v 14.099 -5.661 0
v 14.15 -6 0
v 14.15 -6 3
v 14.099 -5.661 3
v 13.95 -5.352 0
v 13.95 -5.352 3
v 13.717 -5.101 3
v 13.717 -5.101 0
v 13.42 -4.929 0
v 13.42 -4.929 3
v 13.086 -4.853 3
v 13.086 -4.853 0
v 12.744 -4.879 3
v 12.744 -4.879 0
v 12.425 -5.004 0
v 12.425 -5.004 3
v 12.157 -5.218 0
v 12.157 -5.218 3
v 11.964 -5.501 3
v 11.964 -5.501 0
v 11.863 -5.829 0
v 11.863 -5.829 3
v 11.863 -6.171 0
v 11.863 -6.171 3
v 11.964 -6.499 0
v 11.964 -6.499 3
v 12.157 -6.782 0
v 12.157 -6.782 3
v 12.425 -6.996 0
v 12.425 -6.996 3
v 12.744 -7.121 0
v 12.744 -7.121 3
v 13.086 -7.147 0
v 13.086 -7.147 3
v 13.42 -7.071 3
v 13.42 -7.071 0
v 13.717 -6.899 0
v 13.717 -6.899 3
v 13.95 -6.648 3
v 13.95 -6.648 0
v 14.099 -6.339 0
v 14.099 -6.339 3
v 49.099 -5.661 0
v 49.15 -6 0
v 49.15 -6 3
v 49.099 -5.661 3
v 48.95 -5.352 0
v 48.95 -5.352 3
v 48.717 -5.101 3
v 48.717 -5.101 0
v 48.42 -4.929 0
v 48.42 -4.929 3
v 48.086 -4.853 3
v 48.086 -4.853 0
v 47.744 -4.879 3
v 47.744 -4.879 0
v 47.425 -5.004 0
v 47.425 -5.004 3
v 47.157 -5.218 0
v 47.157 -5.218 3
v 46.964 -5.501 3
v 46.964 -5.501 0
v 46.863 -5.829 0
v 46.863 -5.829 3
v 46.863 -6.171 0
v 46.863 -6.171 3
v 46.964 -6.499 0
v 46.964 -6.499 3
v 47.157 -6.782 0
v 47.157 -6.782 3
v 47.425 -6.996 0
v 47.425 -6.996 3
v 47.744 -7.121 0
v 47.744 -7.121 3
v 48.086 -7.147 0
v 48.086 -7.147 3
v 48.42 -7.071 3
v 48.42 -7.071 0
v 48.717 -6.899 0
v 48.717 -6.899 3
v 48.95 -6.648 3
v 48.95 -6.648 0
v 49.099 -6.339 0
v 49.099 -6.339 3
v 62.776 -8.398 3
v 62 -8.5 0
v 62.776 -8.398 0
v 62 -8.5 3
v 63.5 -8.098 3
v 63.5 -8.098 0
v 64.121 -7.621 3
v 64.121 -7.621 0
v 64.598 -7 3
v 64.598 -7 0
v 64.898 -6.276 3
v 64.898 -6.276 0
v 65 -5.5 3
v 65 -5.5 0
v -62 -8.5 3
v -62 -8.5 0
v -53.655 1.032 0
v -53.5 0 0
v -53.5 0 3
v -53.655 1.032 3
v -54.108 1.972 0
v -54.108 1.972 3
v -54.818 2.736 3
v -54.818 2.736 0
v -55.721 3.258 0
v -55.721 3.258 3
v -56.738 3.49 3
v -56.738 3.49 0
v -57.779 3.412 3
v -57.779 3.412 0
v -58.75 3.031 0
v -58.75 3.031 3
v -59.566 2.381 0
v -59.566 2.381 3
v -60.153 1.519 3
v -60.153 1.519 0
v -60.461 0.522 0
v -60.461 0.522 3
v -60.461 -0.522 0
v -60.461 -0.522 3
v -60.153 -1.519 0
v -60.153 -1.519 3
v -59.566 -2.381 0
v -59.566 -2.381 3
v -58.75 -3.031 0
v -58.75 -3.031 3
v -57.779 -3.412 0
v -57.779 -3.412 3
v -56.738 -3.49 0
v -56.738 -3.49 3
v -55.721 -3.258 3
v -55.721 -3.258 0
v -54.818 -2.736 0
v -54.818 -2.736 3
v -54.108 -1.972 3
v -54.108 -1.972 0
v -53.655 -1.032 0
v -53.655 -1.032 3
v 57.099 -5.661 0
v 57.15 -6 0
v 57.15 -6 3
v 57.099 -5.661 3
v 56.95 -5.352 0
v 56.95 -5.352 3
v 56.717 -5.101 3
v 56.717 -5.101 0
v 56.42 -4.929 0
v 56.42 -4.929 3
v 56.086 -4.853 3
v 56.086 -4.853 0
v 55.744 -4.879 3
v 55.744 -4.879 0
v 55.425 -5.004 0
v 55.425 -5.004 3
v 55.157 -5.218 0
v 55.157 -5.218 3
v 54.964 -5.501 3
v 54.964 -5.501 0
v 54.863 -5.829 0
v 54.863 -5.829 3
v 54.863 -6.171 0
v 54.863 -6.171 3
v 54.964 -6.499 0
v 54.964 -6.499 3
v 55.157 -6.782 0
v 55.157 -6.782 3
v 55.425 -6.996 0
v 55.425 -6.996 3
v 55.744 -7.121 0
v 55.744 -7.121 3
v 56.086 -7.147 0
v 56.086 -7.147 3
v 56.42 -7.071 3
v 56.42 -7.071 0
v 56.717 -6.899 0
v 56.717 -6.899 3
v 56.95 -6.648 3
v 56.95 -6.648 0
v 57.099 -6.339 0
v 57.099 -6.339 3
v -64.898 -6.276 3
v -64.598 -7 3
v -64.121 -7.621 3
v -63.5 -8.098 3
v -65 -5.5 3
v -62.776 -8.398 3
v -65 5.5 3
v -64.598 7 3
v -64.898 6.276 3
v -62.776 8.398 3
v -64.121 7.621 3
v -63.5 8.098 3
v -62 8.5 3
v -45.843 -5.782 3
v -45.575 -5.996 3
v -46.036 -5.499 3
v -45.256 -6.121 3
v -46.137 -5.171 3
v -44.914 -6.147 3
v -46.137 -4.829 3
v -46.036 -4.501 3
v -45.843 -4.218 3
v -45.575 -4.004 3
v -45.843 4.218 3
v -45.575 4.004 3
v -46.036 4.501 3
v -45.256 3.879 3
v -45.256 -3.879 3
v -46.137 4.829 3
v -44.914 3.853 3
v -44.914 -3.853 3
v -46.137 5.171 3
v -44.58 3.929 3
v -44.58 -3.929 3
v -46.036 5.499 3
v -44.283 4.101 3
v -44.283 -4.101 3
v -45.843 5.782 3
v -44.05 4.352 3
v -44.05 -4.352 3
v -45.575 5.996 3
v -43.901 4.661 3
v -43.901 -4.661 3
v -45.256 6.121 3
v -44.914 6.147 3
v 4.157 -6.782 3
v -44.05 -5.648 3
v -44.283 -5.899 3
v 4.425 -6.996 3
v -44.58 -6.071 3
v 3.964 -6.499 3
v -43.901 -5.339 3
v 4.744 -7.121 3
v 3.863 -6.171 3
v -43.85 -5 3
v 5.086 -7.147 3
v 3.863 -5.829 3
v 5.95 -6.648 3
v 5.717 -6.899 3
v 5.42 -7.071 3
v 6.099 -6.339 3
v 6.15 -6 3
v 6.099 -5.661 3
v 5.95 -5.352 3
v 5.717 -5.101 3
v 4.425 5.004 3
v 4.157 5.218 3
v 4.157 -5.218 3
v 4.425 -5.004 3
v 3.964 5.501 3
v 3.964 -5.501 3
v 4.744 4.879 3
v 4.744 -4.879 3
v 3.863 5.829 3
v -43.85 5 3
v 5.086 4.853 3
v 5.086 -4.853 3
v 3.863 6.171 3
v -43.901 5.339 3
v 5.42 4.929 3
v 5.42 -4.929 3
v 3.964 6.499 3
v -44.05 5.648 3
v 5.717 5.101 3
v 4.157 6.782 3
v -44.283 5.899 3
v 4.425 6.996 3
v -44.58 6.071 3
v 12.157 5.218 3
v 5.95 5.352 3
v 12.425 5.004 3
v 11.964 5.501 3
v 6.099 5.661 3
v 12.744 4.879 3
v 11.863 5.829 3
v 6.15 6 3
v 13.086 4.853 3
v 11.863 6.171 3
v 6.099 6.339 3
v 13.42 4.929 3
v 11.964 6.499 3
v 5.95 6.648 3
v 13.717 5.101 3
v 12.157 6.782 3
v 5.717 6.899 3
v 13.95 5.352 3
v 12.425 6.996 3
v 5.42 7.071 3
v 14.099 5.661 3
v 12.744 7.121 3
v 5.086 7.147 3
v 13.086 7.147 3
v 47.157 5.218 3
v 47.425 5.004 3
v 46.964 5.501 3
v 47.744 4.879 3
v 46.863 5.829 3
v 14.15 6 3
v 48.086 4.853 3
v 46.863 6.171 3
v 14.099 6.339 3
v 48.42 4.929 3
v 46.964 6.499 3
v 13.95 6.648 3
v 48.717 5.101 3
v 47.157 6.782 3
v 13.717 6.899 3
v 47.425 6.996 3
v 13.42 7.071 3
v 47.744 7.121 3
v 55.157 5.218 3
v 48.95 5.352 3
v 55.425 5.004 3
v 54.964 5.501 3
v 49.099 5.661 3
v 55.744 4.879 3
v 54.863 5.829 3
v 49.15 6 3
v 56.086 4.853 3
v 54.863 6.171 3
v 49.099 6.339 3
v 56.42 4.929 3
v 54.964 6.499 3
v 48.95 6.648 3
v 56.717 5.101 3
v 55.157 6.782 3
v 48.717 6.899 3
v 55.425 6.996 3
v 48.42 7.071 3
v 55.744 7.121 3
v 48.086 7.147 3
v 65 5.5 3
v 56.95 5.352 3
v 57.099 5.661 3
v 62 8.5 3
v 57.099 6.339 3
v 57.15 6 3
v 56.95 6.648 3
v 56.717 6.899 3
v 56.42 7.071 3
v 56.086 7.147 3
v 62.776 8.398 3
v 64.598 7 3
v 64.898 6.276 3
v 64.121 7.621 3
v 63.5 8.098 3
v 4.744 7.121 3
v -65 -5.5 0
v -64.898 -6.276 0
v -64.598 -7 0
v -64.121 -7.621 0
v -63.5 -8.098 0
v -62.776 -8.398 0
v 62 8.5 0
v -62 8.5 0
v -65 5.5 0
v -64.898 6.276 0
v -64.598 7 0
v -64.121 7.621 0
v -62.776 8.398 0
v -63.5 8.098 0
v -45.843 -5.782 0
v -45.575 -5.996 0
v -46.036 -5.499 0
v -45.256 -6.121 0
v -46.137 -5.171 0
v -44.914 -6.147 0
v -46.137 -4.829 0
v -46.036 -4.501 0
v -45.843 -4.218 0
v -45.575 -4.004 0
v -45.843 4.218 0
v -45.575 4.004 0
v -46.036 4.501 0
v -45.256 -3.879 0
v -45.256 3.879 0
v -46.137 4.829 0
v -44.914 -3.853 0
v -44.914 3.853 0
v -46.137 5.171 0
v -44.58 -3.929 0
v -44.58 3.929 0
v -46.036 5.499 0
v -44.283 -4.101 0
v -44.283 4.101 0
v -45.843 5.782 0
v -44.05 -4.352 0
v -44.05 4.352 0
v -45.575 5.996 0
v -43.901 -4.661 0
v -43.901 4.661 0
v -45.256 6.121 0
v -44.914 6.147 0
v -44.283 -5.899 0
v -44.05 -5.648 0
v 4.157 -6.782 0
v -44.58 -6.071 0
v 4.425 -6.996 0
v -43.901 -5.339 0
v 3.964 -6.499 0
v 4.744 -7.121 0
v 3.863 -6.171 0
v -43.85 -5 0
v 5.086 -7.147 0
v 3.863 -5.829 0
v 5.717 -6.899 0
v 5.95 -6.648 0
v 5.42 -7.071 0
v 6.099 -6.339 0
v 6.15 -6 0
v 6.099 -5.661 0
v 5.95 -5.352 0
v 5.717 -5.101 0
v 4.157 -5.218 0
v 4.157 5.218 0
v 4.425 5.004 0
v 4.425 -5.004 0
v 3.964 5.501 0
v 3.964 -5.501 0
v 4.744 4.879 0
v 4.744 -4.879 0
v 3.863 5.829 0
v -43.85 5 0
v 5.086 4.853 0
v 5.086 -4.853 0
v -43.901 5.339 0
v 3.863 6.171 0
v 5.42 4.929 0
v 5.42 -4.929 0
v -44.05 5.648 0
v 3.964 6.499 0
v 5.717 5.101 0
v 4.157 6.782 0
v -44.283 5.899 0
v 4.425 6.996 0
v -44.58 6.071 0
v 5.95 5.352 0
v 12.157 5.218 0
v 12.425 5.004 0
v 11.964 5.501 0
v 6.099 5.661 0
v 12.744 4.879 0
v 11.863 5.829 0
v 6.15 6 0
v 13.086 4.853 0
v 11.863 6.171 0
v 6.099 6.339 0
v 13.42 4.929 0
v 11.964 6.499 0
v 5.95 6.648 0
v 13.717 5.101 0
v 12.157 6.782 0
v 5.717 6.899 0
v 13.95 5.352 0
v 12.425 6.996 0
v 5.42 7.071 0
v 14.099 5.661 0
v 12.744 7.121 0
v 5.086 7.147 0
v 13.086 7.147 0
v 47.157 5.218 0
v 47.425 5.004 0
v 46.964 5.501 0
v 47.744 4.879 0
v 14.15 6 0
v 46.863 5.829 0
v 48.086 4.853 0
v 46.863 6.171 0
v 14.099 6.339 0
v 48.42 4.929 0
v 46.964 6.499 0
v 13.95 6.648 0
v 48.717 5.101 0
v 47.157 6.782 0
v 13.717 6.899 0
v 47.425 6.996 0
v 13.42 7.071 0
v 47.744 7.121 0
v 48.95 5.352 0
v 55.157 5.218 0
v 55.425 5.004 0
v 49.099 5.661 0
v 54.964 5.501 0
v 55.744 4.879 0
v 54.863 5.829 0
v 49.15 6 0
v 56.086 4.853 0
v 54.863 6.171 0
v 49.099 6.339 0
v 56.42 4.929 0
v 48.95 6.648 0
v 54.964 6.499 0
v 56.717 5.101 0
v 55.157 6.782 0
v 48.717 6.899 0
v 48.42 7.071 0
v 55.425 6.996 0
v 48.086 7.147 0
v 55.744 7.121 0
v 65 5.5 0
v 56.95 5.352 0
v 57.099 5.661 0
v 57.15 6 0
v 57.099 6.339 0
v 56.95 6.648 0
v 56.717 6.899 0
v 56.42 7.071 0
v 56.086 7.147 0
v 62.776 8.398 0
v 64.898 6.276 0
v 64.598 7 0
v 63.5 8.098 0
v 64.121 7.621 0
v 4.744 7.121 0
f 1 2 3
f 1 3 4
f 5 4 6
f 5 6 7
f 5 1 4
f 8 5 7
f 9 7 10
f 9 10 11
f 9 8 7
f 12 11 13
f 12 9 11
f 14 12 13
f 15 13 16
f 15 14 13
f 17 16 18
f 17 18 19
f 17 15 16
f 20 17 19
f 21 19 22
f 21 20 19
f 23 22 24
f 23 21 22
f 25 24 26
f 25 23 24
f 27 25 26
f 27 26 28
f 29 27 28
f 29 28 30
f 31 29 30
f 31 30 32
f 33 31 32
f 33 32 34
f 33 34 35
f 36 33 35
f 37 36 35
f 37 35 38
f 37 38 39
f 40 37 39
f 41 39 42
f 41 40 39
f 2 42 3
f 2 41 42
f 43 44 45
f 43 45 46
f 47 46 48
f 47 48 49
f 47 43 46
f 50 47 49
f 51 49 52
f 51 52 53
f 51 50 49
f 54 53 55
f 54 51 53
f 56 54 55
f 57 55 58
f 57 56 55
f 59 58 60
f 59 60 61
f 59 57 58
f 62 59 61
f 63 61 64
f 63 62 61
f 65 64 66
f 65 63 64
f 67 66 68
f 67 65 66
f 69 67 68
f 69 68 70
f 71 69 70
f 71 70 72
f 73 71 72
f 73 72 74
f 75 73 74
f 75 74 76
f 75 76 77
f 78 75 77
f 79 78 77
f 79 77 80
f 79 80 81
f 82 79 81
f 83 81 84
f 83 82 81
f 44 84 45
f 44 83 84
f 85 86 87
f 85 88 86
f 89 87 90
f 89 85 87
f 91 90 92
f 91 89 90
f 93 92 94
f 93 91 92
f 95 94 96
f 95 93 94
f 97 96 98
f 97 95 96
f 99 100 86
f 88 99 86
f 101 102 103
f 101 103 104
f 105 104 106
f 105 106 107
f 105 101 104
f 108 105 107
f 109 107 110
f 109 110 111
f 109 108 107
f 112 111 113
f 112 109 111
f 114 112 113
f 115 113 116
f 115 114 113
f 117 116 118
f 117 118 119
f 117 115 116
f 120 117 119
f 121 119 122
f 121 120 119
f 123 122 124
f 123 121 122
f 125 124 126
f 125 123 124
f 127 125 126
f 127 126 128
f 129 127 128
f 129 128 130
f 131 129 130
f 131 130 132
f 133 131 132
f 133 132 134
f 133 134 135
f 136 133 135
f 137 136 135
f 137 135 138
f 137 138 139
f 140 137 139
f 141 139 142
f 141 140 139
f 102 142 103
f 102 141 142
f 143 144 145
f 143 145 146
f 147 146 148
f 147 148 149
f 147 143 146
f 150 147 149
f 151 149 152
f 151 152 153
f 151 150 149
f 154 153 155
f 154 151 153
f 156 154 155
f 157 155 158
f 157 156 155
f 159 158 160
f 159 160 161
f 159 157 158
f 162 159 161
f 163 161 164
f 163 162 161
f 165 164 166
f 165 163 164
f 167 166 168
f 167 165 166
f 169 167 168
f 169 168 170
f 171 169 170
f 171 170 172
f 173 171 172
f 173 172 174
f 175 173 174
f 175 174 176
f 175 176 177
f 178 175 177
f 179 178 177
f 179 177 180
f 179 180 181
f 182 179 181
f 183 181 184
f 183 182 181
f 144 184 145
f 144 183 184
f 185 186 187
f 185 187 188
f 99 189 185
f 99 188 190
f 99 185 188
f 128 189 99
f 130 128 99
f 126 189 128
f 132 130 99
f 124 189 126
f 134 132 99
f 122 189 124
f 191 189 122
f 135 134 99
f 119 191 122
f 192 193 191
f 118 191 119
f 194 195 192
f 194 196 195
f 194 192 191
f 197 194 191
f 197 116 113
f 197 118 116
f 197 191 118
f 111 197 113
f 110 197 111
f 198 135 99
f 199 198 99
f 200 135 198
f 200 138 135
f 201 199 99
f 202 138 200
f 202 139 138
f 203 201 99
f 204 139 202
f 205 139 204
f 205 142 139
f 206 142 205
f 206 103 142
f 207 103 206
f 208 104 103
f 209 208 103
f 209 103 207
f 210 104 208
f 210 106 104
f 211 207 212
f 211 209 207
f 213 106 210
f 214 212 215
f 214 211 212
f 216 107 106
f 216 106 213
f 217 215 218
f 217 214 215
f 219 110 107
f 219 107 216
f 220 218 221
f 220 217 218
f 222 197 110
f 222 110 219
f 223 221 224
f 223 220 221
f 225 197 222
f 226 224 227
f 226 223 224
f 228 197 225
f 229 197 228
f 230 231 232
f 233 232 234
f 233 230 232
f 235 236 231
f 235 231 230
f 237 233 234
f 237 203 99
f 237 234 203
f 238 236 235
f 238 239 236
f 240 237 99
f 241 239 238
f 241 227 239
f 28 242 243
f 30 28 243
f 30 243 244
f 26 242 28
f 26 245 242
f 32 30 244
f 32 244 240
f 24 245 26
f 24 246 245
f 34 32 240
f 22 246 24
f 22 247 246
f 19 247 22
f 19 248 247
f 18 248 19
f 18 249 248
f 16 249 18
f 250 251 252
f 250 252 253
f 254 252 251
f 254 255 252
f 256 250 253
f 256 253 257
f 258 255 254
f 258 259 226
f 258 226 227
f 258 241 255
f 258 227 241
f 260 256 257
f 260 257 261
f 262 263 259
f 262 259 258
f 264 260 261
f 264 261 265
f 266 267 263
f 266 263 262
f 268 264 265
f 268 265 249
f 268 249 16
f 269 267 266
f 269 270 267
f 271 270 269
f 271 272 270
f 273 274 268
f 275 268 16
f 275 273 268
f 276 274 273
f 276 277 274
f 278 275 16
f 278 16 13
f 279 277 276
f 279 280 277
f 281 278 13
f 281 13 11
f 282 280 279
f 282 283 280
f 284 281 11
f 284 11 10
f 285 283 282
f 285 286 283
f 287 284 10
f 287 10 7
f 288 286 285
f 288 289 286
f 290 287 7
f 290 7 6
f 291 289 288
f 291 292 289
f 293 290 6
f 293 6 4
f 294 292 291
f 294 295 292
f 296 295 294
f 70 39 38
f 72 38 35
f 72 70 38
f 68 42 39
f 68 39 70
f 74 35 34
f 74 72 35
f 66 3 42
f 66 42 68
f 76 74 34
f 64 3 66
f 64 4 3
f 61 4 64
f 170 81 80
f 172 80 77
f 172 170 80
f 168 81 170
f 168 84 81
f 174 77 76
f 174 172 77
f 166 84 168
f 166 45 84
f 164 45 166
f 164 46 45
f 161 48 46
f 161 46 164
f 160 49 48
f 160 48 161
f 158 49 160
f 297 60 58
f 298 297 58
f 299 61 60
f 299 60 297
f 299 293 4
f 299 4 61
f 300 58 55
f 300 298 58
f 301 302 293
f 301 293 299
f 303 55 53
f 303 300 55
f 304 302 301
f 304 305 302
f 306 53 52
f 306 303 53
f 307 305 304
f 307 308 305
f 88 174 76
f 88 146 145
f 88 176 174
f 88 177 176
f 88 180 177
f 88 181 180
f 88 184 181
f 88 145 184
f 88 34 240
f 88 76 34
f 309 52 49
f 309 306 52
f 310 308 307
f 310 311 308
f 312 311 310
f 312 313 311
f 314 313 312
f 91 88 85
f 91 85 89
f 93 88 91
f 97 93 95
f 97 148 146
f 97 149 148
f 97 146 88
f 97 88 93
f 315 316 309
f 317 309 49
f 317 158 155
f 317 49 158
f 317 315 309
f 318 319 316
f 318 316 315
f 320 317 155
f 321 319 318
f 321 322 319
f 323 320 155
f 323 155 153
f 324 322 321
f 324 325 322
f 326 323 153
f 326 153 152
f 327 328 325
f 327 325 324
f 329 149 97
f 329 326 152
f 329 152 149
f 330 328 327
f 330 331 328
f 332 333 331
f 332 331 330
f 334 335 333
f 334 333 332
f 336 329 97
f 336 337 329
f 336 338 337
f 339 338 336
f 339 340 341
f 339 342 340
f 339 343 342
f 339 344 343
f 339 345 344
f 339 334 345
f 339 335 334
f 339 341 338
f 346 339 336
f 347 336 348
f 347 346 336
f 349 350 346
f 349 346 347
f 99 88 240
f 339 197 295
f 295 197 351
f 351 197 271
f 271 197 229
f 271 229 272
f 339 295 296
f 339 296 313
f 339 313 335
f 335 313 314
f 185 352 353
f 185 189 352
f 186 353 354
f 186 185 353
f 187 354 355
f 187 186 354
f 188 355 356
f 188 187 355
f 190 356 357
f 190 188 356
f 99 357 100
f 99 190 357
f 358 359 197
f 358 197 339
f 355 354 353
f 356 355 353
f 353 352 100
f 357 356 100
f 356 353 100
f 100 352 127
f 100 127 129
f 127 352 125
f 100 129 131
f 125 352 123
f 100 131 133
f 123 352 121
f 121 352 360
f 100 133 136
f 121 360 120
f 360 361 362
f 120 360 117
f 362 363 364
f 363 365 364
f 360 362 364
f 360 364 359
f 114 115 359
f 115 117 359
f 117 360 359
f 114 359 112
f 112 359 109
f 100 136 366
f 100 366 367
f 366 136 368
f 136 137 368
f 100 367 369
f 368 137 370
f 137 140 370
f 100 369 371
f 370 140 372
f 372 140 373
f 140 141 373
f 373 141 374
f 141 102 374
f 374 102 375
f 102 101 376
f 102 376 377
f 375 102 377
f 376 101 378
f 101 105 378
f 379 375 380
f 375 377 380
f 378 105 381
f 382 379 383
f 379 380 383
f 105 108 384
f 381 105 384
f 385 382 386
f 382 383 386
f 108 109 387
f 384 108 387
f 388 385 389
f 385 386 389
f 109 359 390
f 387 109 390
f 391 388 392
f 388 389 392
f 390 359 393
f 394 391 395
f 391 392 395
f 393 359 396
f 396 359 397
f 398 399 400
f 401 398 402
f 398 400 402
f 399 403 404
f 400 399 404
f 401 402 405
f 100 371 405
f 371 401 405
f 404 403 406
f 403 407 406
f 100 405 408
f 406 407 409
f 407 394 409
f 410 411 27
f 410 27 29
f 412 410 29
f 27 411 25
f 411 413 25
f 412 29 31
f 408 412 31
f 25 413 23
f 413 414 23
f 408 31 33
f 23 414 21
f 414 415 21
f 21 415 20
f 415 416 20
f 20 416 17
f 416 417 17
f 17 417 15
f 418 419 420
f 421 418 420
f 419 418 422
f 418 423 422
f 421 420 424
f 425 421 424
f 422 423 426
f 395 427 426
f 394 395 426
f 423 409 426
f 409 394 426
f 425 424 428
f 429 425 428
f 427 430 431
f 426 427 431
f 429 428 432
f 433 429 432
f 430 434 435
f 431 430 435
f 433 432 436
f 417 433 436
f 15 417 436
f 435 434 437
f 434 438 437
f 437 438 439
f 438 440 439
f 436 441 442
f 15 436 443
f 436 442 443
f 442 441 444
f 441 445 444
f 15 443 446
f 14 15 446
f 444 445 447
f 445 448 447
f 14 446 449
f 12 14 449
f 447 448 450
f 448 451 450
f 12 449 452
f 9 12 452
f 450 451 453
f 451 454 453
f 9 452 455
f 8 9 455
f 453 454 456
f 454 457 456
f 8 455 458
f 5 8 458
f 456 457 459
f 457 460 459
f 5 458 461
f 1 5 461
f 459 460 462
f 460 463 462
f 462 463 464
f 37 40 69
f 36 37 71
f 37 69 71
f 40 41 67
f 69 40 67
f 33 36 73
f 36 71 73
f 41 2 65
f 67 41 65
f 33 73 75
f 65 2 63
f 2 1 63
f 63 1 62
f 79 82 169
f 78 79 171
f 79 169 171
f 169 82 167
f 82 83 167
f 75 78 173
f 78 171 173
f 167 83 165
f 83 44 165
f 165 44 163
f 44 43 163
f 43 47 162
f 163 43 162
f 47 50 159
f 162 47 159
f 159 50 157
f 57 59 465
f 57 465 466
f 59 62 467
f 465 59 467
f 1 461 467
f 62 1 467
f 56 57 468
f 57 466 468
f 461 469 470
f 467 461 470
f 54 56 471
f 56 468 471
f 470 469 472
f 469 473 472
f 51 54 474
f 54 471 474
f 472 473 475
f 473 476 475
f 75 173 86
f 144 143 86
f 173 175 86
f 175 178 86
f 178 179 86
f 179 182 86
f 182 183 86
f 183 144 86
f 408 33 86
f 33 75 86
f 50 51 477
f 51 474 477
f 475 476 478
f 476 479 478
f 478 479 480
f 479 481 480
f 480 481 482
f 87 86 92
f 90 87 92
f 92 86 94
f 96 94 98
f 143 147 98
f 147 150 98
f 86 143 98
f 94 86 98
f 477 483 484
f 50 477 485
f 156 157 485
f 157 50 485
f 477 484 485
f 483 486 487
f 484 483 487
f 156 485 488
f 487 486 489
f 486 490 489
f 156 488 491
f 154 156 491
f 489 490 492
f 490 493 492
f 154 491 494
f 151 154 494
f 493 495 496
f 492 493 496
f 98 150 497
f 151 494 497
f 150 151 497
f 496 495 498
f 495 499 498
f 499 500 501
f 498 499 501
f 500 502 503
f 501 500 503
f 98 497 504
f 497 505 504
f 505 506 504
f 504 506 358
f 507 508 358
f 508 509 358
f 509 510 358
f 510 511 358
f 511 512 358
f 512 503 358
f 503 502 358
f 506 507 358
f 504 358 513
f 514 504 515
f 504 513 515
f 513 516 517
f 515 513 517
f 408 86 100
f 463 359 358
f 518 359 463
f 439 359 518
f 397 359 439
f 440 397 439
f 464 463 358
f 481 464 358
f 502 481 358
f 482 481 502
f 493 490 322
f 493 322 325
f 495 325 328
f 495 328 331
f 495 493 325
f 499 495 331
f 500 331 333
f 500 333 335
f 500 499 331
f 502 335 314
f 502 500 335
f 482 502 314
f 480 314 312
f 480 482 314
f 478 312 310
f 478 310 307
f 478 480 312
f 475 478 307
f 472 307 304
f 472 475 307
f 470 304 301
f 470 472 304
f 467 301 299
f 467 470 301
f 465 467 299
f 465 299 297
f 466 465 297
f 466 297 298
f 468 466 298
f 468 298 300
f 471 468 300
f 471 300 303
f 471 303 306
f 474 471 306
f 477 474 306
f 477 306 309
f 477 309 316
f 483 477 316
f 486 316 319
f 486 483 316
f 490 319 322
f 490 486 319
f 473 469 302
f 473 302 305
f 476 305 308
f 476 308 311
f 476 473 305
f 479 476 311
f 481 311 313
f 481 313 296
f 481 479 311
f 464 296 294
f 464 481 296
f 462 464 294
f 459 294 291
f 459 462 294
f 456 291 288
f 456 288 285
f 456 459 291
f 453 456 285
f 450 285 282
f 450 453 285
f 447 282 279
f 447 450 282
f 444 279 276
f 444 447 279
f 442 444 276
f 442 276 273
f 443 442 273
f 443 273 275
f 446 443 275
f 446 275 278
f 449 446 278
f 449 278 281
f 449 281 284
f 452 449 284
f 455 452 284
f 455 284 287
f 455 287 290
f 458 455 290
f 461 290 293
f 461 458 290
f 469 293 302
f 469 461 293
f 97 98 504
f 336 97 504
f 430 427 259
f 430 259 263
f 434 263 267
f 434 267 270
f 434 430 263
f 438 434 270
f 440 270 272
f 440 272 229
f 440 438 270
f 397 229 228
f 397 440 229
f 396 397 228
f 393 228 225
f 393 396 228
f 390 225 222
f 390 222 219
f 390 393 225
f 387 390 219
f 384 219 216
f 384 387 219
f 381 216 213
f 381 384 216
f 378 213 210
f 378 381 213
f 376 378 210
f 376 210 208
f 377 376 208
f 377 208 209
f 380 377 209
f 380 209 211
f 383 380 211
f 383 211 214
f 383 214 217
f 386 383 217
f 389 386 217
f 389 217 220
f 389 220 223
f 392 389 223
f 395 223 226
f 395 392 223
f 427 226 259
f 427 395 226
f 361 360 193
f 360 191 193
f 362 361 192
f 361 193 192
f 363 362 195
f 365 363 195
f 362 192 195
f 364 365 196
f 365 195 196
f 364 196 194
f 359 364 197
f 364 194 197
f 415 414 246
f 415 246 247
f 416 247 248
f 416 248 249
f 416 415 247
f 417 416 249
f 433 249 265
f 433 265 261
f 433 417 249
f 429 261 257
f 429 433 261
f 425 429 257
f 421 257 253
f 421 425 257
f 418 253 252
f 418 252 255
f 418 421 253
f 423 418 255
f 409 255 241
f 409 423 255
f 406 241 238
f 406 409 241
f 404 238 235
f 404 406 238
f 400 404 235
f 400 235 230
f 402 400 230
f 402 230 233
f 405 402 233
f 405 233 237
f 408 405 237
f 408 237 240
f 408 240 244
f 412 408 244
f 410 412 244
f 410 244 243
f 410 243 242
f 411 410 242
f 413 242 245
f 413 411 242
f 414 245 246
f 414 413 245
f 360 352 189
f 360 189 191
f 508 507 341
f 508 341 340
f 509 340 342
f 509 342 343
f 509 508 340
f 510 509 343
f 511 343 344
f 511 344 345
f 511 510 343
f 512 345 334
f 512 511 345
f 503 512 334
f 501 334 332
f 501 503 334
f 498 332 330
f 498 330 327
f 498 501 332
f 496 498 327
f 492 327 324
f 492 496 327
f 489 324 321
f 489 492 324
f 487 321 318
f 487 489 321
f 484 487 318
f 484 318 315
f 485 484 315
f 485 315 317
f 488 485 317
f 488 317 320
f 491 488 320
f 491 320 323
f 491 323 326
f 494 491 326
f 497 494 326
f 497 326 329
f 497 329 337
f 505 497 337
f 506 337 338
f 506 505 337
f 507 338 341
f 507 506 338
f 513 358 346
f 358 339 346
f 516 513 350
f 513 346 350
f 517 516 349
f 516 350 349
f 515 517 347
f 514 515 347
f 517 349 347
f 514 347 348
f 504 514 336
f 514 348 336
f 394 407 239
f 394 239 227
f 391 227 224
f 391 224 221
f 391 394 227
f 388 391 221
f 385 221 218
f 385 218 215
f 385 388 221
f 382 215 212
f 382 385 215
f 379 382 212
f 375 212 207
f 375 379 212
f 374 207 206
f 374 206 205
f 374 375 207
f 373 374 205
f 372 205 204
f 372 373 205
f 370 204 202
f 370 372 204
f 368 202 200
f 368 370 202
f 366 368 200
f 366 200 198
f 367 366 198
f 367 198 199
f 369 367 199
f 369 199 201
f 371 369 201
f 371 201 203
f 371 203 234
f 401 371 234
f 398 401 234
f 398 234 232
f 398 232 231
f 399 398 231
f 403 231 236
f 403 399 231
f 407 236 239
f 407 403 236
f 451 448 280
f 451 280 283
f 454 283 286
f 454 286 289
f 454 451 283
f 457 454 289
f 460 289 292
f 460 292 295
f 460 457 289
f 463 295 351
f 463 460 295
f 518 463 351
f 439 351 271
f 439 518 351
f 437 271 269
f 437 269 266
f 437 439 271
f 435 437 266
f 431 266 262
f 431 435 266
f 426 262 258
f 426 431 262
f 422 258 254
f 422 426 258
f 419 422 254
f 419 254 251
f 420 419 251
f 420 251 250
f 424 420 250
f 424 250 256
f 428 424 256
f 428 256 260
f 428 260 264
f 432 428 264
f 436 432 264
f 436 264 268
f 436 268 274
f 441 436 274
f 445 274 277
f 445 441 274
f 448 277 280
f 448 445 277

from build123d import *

# Parameters (mm, degrees)
SKETCH_1_W      = 130
SKETCH_1_H      = 17
SKETCH_1_R      = 3.5
SKETCH_1_R_2    = 1.15
EXTRUDE_1_DEPTH = 3
FILLET_1_R      = 3


with BuildPart() as part:
    # 草图1 → 凸台-拉伸1 (new body)
    with BuildSketch(Plane.XY):
        Rectangle(SKETCH_1_W, SKETCH_1_H)
        with Locations((-57, 0)):
            Circle(SKETCH_1_R, mode=Mode.SUBTRACT)
        with Locations((-45, 5)):
            Circle(SKETCH_1_R_2, mode=Mode.SUBTRACT)
        with Locations((-45, -5)):
            Circle(SKETCH_1_R_2, mode=Mode.SUBTRACT)
        with Locations((5, 6)):
            Circle(SKETCH_1_R_2, mode=Mode.SUBTRACT)
        with Locations((13, 6)):
            Circle(SKETCH_1_R_2, mode=Mode.SUBTRACT)
        with Locations((5, -6)):
            Circle(SKETCH_1_R_2, mode=Mode.SUBTRACT)
        with Locations((13, -6)):
            Circle(SKETCH_1_R_2, mode=Mode.SUBTRACT)
        with Locations((48, 6)):
            Circle(SKETCH_1_R_2, mode=Mode.SUBTRACT)
        with Locations((56, 6)):
            Circle(SKETCH_1_R_2, mode=Mode.SUBTRACT)
        with Locations((56, -6)):
            Circle(SKETCH_1_R_2, mode=Mode.SUBTRACT)
        with Locations((48, -6)):
            Circle(SKETCH_1_R_2, mode=Mode.SUBTRACT)
    extrude(amount=EXTRUDE_1_DEPTH)

    # 圆角1
    fillet_1_edges = [part.edges().sort_by_distance(p)[0] for p in [
        (65, -8.5, 1.5),
        (-65, -8.5, 1.5),
        (-65, 8.5, 1.5),
        (65, 8.5, 1.5),
    ]]
    fillet(fillet_1_edges, radius=FILLET_1_R)


solid = part.part
